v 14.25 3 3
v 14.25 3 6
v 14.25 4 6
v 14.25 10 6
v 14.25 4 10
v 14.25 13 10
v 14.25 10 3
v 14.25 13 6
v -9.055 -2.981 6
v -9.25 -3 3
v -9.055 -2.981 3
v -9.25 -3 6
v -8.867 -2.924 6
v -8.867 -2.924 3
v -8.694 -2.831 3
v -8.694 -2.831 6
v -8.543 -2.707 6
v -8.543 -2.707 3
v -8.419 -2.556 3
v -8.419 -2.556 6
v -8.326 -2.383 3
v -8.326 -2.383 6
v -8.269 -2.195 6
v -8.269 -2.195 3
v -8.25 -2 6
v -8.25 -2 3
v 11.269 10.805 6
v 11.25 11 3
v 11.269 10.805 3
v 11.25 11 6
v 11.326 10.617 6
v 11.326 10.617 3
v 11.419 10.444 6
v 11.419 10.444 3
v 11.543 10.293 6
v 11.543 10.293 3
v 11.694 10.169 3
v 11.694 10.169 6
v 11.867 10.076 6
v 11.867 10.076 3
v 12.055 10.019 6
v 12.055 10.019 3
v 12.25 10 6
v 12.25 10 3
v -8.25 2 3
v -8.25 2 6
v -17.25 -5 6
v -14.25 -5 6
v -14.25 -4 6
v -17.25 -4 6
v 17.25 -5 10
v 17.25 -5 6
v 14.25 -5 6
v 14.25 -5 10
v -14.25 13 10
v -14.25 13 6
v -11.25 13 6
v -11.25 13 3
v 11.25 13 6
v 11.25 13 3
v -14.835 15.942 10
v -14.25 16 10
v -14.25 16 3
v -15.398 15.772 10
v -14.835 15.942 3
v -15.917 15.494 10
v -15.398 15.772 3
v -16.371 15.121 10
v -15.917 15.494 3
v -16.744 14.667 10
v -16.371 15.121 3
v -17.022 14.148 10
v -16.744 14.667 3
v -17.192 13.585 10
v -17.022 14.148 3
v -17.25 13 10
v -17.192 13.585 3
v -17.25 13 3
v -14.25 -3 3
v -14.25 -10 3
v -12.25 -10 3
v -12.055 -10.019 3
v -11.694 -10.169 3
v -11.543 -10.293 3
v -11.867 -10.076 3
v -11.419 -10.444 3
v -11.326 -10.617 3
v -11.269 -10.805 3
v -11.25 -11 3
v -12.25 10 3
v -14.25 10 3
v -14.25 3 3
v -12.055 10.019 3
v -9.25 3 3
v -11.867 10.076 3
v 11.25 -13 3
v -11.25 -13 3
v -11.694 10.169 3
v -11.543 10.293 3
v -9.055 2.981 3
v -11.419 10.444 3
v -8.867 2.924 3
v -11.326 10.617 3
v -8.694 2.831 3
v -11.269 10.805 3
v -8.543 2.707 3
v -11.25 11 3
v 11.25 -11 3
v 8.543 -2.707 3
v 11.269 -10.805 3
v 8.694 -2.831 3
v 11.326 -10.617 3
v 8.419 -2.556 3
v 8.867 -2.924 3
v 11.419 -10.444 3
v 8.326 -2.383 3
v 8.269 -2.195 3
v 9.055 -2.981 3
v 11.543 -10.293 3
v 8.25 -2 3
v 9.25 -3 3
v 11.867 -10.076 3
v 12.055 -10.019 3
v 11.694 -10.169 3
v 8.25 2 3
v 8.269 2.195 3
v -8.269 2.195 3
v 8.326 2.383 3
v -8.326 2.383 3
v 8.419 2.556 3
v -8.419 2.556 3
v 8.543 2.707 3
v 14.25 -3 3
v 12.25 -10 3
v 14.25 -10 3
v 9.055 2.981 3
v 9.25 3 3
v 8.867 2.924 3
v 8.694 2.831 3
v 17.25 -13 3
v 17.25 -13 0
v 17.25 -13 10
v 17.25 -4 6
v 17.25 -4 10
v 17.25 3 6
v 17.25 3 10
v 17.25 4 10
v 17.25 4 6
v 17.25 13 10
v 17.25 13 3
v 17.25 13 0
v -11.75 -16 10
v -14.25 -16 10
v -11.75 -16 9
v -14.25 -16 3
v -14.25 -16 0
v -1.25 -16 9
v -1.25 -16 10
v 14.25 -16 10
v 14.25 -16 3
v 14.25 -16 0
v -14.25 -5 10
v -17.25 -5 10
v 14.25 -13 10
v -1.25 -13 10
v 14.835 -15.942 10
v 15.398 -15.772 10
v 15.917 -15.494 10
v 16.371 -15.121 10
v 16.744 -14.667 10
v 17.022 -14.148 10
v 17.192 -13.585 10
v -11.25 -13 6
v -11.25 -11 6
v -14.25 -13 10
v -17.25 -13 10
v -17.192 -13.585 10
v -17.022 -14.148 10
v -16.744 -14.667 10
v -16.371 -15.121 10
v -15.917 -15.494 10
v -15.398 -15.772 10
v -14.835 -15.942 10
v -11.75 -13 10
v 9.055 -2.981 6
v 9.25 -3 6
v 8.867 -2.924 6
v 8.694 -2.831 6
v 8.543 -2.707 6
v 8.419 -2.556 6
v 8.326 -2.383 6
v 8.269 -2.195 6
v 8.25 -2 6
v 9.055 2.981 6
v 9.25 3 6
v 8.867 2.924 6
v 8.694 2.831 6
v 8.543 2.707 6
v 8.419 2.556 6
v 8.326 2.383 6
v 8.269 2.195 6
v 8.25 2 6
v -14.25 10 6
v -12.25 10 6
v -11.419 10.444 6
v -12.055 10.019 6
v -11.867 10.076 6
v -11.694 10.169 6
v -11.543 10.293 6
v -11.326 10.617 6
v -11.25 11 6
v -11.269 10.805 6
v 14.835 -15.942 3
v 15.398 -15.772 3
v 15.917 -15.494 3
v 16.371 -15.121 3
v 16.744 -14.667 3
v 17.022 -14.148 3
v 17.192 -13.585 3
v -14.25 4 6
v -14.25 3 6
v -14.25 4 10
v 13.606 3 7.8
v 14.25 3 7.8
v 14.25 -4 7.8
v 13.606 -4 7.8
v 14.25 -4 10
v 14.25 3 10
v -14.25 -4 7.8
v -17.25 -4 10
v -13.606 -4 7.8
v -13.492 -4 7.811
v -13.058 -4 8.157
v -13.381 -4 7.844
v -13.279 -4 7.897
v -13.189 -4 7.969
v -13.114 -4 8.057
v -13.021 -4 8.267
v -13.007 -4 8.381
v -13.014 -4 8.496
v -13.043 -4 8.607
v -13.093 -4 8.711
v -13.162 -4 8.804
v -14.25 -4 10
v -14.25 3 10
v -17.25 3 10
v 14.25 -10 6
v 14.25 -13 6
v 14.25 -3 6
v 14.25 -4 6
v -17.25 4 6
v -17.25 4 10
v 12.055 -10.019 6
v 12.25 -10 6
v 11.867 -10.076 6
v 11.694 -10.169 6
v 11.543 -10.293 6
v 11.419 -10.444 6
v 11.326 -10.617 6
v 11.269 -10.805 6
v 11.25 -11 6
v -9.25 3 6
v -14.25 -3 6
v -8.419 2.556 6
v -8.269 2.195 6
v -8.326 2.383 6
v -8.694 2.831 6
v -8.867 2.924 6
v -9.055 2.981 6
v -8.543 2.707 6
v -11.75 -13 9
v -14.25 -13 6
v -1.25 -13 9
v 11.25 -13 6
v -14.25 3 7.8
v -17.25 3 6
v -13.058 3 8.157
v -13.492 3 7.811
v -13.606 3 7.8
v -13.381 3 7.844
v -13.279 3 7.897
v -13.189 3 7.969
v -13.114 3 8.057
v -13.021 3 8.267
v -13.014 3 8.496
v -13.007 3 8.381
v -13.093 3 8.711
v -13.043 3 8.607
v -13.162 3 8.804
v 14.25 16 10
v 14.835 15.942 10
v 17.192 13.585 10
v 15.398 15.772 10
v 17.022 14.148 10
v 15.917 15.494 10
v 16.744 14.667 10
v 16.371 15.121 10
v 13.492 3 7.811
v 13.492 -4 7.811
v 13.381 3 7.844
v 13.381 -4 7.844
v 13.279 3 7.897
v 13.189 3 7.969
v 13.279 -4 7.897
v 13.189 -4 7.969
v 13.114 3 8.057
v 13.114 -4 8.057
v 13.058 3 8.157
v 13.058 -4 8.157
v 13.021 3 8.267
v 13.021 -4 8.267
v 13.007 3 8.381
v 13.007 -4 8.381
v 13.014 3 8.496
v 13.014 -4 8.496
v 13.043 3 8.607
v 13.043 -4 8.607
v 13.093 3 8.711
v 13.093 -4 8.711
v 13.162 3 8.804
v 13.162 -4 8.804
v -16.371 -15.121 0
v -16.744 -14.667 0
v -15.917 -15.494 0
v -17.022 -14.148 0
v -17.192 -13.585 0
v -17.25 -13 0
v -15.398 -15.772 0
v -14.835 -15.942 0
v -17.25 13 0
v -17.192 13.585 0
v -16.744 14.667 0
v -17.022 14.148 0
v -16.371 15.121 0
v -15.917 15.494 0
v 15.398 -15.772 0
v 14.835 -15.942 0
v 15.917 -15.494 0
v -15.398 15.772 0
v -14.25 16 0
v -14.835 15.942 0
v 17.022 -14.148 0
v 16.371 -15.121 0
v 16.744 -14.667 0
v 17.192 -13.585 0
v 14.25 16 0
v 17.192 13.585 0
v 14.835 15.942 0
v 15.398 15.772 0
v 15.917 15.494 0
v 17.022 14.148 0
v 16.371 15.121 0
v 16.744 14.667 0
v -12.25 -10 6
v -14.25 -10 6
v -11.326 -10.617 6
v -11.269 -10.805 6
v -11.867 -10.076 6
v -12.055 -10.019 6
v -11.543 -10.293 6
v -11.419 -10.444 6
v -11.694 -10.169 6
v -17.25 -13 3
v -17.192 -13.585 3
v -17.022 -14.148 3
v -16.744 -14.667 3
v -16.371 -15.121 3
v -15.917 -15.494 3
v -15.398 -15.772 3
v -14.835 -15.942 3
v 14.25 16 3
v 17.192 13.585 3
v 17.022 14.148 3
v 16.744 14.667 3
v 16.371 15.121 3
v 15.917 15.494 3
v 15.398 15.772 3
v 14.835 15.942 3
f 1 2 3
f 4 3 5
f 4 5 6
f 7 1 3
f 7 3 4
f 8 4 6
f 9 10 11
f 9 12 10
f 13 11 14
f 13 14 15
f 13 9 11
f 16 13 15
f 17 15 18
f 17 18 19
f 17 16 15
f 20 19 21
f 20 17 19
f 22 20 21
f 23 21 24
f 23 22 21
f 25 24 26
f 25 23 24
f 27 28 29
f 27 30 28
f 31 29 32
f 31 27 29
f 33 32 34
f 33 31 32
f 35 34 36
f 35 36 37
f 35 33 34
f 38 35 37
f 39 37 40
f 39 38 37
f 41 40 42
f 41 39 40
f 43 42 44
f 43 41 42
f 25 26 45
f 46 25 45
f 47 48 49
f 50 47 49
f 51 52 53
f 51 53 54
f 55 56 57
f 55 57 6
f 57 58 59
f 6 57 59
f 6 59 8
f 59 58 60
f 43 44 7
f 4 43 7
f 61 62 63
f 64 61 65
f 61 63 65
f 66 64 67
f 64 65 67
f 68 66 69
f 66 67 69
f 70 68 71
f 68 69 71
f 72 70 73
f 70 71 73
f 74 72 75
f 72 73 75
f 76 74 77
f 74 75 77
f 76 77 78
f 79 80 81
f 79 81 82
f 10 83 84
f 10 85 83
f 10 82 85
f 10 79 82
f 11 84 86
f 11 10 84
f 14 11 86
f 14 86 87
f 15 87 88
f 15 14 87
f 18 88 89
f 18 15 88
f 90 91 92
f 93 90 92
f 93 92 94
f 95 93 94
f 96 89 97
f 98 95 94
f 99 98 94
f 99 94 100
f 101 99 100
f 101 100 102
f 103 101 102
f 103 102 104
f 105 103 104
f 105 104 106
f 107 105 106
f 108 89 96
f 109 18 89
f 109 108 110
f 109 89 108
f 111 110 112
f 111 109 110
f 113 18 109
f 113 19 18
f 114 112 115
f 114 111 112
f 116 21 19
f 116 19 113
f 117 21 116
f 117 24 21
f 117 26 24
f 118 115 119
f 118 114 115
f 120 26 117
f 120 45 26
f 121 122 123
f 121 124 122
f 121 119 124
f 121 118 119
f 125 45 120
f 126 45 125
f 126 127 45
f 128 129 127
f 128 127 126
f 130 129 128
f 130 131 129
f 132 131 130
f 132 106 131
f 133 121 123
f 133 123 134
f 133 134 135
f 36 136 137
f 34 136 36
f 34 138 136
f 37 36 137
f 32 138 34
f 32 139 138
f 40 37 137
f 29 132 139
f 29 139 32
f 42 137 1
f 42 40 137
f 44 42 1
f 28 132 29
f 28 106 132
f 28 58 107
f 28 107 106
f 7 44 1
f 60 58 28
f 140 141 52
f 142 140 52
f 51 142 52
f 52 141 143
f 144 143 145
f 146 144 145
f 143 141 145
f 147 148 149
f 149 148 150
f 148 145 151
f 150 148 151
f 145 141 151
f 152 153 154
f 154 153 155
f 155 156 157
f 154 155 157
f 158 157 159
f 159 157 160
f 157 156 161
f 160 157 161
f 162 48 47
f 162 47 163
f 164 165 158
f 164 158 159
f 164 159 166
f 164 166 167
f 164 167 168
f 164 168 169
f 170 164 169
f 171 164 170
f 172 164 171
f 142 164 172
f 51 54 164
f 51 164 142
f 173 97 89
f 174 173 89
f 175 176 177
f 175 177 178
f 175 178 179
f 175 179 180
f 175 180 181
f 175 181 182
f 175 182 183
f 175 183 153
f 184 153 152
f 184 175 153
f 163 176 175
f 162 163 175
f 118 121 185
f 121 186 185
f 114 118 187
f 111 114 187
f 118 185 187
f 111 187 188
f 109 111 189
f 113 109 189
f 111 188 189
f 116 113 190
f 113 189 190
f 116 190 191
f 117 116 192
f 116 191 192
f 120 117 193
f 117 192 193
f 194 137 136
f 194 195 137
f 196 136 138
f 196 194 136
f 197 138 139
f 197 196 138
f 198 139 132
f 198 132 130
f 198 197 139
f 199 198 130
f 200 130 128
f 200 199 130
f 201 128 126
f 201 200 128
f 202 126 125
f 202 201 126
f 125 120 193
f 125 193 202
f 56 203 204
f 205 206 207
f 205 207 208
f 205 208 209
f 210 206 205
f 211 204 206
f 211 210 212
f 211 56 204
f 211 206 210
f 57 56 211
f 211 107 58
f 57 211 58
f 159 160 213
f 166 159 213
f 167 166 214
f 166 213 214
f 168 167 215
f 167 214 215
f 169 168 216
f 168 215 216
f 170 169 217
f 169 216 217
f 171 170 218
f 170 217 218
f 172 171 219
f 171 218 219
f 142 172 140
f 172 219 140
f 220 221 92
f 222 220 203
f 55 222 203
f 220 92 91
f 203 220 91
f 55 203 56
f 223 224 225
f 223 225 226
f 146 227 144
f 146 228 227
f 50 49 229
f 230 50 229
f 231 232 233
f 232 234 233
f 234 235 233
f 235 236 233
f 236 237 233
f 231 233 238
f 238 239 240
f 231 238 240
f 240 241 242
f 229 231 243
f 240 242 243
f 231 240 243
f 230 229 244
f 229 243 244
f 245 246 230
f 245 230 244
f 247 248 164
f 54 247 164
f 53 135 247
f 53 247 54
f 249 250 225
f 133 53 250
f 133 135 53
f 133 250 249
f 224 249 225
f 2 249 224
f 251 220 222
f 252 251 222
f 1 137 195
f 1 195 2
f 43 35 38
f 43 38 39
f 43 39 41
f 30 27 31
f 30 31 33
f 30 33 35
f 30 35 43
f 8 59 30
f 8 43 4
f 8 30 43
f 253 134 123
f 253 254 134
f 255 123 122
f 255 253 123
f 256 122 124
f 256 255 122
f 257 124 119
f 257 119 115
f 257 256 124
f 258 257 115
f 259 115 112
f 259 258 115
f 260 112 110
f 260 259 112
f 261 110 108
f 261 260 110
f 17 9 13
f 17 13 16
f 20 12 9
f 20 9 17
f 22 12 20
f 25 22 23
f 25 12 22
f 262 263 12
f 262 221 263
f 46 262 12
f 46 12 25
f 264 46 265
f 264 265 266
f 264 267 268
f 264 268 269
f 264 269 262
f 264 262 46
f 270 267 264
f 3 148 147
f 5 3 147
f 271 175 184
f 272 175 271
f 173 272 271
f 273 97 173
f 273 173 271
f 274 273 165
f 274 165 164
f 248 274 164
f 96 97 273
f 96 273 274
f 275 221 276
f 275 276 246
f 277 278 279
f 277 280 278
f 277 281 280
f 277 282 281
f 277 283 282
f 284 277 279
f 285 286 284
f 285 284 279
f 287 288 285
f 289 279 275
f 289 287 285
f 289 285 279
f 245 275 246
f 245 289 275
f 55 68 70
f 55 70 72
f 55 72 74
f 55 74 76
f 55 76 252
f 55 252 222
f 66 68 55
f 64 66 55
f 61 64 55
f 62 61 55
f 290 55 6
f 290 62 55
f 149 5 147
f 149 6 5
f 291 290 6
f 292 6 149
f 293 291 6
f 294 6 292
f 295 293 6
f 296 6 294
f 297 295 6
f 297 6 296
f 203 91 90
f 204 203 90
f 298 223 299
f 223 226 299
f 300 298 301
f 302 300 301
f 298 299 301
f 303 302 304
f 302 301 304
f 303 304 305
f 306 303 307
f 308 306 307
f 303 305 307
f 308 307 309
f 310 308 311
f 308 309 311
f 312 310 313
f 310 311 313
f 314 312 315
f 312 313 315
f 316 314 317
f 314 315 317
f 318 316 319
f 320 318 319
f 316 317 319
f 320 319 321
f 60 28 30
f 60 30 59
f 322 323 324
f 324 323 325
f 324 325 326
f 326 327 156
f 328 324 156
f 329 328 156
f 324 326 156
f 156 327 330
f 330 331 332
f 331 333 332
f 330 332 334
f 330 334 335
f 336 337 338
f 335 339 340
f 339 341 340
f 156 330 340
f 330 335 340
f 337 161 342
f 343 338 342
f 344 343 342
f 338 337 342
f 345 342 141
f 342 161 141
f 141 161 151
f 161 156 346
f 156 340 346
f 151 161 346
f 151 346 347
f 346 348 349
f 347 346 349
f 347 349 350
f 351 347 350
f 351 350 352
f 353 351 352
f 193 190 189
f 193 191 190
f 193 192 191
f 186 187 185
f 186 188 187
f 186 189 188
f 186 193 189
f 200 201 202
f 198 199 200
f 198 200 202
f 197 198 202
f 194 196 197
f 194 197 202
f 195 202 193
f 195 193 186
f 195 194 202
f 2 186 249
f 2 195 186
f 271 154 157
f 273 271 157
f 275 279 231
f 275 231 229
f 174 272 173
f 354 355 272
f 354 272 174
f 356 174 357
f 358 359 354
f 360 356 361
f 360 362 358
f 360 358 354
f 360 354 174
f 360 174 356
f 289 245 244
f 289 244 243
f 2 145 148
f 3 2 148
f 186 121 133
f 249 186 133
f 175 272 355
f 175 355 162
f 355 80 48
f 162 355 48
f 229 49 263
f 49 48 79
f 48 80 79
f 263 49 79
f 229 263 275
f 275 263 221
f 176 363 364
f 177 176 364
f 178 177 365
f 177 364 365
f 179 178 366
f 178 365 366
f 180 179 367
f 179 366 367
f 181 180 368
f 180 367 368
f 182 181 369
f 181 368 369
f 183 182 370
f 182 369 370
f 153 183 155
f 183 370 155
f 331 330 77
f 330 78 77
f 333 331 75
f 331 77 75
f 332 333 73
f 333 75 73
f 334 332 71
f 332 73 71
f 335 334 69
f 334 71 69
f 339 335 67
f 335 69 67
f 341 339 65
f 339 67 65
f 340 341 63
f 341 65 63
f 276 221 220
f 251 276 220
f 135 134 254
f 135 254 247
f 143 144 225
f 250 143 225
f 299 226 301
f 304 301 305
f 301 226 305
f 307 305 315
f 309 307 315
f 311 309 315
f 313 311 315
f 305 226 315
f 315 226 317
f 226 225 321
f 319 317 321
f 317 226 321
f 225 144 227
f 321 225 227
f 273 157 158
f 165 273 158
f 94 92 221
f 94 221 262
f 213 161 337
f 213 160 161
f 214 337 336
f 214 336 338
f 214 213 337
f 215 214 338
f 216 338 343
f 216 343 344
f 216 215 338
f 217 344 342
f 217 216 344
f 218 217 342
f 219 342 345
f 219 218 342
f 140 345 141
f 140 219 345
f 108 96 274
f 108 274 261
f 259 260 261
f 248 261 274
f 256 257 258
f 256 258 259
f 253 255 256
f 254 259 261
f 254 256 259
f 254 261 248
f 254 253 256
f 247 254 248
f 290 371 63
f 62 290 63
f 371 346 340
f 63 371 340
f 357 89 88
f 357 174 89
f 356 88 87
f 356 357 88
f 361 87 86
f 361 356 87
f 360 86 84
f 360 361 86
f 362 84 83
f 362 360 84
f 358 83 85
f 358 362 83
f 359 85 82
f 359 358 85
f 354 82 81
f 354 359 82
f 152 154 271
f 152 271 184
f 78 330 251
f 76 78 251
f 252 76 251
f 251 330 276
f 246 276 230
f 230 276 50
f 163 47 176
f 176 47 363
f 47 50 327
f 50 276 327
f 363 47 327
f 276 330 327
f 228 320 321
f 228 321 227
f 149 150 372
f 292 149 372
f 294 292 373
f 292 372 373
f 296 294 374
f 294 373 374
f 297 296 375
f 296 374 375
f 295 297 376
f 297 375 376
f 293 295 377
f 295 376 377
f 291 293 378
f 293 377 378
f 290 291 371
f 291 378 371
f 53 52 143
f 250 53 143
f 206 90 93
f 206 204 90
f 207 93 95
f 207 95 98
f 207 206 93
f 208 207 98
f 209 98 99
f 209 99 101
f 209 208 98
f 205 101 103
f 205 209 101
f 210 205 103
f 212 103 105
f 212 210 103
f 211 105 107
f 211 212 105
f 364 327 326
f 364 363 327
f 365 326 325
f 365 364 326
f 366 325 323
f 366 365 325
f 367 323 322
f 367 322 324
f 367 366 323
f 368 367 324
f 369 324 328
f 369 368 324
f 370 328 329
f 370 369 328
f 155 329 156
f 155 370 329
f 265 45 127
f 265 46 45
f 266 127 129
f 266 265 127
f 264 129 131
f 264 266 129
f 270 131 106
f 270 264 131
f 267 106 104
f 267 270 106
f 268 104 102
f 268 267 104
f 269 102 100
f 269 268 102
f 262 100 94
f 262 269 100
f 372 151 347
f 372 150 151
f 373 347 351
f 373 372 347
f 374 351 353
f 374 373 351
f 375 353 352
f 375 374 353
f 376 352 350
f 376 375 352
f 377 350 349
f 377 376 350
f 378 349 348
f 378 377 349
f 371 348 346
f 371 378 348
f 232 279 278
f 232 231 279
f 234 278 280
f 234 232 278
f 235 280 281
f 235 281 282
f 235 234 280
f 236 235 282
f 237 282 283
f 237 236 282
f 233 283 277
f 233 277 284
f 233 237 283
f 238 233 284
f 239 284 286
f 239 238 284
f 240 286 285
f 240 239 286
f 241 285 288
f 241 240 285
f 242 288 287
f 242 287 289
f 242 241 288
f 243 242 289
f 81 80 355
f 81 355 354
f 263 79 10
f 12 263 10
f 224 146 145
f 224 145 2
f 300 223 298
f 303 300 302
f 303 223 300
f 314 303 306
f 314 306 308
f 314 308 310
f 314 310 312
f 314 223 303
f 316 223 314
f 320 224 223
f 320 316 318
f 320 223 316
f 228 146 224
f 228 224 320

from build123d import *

# Parameters (mm, degrees)
F1_W      = 34.5
F1_H      = 32
F2_DEPTH  = 3
F3_R      = 3
F4_W      = 28.5
F4_H      = 26
F5_DEPTH  = 7
F6_W      = 6
F6_H      = 6
F6_W_2    = 3
F6_H_2    = 3
F7_DEPTH  = 3
F8_W      = 10.5
F8_H      = 1
F9_DEPTH  = 3
F10_W     = 1
F10_H     = 4
F11_DEPTH = 34.5
F13_DEPTH = 7
F14_R     = 1
F15_R     = 0.6


with BuildPart() as f2:
    # F1 (on Top) → F2 (new body)
    with BuildSketch(Plane.XY):
        Rectangle(F1_W, F1_H)
    extrude(amount=F2_DEPTH)

    # F3
    f3_edges = [f2.edges().sort_by_distance(p)[0] for p in [
        (17.25, -16, 1.5),
        (-17.25, -16, 1.5),
        (17.25, 16, 1.5),
        (-17.25, 16, 1.5),
    ]]
    fillet(f3_edges, radius=F3_R)

    # F4 (on face) → F5 (join)
    with BuildSketch(Plane.XY.offset(3)):
        with BuildLine():
            ThreePointArc((14.25, -16), (16.3713203436, -15.1213203436), (17.25, -13))
            Line((17.25, -13), (17.25, 13))
            ThreePointArc((17.25, 13), (16.3713203436, 15.1213203436), (14.25, 16))
            Line((14.25, 16), (-14.25, 16))
            ThreePointArc((-14.25, 16), (-16.3713203436, 15.1213203436), (-17.25, 13))
            Line((-17.25, 13), (-17.25, -13))
            ThreePointArc((-17.25, -13), (-16.3713203436, -15.1213203436), (-14.25, -16))
            Line((-14.25, -16), (14.25, -16))
        make_face()
        Rectangle(F4_W, F4_H, mode=Mode.SUBTRACT)
    extrude(amount=F5_DEPTH)

    # F6 (on face) → F7 (join)
    with BuildSketch(Plane.XY.offset(3)):
        with Locations((-11.25, 0)):
            Rectangle(F6_W, F6_H)
        with Locations((11.25, 0)):
            Rectangle(F6_W, F6_H)
        with Locations((-12.75, 11.5)):
            Rectangle(F6_W_2, F6_H_2)
        with Locations((12.75, 11.5)):
            Rectangle(F6_W_2, F6_H_2)
        with Locations((-12.75, -11.5)):
            Rectangle(F6_W_2, F6_H_2)
        with Locations((12.75, -11.5)):
            Rectangle(F6_W_2, F6_H_2)
    extrude(amount=F7_DEPTH)

    # F8 (on face) → F9 (cut, through all)
    with BuildSketch(Plane.XZ.offset(16)):
        with Locations((-6.5, 9.5)):
            Rectangle(F8_W, F8_H)
    extrude(amount=-F9_DEPTH, mode=Mode.SUBTRACT)

    # F10 (on face) → F11 (cut, through all)
    with BuildSketch(Plane.YZ.offset(17.25)):
        with Locations((-4.5, 8)):
            Rectangle(F10_W, F10_H)
        with Locations((3.5, 8)):
            Rectangle(F10_W, F10_H)
    extrude(amount=-F11_DEPTH, mode=Mode.SUBTRACT)

    # F12 (on face) → F13 (join, through all)
    with BuildSketch(Plane(origin=(0, 3, 0), x_dir=(-1, 0, 0), z_dir=(0, 1, 0))):
        Polygon((-14.25, 10), (-14.25, 7.8), (-12.25, 7.8), align=None)
        Polygon((14.25, 10), (12.25, 7.8), (14.25, 7.8), align=None)
    extrude(amount=-F13_DEPTH)

    # F14
    f14_edges = [f2.edges().sort_by_distance(p)[0] for p in [
        (8.25, 3, 4.5),
        (8.25, -3, 4.5),
        (11.25, -10, 4.5),
        (11.25, 10, 4.5),
        (-11.25, -10, 4.5),
        (-11.25, 10, 4.5),
        (-8.25, 3, 4.5),
        (-8.25, -3, 4.5),
    ]]
    fillet(f14_edges, radius=F14_R)

    # F15
    f15_edges = [f2.edges().sort_by_distance(p)[0] for p in [
        (12.25, -0.5, 7.8),
        (-12.25, -0.5, 7.8),
    ]]
    fillet(f15_edges, radius=F15_R)


solid = f2.part
